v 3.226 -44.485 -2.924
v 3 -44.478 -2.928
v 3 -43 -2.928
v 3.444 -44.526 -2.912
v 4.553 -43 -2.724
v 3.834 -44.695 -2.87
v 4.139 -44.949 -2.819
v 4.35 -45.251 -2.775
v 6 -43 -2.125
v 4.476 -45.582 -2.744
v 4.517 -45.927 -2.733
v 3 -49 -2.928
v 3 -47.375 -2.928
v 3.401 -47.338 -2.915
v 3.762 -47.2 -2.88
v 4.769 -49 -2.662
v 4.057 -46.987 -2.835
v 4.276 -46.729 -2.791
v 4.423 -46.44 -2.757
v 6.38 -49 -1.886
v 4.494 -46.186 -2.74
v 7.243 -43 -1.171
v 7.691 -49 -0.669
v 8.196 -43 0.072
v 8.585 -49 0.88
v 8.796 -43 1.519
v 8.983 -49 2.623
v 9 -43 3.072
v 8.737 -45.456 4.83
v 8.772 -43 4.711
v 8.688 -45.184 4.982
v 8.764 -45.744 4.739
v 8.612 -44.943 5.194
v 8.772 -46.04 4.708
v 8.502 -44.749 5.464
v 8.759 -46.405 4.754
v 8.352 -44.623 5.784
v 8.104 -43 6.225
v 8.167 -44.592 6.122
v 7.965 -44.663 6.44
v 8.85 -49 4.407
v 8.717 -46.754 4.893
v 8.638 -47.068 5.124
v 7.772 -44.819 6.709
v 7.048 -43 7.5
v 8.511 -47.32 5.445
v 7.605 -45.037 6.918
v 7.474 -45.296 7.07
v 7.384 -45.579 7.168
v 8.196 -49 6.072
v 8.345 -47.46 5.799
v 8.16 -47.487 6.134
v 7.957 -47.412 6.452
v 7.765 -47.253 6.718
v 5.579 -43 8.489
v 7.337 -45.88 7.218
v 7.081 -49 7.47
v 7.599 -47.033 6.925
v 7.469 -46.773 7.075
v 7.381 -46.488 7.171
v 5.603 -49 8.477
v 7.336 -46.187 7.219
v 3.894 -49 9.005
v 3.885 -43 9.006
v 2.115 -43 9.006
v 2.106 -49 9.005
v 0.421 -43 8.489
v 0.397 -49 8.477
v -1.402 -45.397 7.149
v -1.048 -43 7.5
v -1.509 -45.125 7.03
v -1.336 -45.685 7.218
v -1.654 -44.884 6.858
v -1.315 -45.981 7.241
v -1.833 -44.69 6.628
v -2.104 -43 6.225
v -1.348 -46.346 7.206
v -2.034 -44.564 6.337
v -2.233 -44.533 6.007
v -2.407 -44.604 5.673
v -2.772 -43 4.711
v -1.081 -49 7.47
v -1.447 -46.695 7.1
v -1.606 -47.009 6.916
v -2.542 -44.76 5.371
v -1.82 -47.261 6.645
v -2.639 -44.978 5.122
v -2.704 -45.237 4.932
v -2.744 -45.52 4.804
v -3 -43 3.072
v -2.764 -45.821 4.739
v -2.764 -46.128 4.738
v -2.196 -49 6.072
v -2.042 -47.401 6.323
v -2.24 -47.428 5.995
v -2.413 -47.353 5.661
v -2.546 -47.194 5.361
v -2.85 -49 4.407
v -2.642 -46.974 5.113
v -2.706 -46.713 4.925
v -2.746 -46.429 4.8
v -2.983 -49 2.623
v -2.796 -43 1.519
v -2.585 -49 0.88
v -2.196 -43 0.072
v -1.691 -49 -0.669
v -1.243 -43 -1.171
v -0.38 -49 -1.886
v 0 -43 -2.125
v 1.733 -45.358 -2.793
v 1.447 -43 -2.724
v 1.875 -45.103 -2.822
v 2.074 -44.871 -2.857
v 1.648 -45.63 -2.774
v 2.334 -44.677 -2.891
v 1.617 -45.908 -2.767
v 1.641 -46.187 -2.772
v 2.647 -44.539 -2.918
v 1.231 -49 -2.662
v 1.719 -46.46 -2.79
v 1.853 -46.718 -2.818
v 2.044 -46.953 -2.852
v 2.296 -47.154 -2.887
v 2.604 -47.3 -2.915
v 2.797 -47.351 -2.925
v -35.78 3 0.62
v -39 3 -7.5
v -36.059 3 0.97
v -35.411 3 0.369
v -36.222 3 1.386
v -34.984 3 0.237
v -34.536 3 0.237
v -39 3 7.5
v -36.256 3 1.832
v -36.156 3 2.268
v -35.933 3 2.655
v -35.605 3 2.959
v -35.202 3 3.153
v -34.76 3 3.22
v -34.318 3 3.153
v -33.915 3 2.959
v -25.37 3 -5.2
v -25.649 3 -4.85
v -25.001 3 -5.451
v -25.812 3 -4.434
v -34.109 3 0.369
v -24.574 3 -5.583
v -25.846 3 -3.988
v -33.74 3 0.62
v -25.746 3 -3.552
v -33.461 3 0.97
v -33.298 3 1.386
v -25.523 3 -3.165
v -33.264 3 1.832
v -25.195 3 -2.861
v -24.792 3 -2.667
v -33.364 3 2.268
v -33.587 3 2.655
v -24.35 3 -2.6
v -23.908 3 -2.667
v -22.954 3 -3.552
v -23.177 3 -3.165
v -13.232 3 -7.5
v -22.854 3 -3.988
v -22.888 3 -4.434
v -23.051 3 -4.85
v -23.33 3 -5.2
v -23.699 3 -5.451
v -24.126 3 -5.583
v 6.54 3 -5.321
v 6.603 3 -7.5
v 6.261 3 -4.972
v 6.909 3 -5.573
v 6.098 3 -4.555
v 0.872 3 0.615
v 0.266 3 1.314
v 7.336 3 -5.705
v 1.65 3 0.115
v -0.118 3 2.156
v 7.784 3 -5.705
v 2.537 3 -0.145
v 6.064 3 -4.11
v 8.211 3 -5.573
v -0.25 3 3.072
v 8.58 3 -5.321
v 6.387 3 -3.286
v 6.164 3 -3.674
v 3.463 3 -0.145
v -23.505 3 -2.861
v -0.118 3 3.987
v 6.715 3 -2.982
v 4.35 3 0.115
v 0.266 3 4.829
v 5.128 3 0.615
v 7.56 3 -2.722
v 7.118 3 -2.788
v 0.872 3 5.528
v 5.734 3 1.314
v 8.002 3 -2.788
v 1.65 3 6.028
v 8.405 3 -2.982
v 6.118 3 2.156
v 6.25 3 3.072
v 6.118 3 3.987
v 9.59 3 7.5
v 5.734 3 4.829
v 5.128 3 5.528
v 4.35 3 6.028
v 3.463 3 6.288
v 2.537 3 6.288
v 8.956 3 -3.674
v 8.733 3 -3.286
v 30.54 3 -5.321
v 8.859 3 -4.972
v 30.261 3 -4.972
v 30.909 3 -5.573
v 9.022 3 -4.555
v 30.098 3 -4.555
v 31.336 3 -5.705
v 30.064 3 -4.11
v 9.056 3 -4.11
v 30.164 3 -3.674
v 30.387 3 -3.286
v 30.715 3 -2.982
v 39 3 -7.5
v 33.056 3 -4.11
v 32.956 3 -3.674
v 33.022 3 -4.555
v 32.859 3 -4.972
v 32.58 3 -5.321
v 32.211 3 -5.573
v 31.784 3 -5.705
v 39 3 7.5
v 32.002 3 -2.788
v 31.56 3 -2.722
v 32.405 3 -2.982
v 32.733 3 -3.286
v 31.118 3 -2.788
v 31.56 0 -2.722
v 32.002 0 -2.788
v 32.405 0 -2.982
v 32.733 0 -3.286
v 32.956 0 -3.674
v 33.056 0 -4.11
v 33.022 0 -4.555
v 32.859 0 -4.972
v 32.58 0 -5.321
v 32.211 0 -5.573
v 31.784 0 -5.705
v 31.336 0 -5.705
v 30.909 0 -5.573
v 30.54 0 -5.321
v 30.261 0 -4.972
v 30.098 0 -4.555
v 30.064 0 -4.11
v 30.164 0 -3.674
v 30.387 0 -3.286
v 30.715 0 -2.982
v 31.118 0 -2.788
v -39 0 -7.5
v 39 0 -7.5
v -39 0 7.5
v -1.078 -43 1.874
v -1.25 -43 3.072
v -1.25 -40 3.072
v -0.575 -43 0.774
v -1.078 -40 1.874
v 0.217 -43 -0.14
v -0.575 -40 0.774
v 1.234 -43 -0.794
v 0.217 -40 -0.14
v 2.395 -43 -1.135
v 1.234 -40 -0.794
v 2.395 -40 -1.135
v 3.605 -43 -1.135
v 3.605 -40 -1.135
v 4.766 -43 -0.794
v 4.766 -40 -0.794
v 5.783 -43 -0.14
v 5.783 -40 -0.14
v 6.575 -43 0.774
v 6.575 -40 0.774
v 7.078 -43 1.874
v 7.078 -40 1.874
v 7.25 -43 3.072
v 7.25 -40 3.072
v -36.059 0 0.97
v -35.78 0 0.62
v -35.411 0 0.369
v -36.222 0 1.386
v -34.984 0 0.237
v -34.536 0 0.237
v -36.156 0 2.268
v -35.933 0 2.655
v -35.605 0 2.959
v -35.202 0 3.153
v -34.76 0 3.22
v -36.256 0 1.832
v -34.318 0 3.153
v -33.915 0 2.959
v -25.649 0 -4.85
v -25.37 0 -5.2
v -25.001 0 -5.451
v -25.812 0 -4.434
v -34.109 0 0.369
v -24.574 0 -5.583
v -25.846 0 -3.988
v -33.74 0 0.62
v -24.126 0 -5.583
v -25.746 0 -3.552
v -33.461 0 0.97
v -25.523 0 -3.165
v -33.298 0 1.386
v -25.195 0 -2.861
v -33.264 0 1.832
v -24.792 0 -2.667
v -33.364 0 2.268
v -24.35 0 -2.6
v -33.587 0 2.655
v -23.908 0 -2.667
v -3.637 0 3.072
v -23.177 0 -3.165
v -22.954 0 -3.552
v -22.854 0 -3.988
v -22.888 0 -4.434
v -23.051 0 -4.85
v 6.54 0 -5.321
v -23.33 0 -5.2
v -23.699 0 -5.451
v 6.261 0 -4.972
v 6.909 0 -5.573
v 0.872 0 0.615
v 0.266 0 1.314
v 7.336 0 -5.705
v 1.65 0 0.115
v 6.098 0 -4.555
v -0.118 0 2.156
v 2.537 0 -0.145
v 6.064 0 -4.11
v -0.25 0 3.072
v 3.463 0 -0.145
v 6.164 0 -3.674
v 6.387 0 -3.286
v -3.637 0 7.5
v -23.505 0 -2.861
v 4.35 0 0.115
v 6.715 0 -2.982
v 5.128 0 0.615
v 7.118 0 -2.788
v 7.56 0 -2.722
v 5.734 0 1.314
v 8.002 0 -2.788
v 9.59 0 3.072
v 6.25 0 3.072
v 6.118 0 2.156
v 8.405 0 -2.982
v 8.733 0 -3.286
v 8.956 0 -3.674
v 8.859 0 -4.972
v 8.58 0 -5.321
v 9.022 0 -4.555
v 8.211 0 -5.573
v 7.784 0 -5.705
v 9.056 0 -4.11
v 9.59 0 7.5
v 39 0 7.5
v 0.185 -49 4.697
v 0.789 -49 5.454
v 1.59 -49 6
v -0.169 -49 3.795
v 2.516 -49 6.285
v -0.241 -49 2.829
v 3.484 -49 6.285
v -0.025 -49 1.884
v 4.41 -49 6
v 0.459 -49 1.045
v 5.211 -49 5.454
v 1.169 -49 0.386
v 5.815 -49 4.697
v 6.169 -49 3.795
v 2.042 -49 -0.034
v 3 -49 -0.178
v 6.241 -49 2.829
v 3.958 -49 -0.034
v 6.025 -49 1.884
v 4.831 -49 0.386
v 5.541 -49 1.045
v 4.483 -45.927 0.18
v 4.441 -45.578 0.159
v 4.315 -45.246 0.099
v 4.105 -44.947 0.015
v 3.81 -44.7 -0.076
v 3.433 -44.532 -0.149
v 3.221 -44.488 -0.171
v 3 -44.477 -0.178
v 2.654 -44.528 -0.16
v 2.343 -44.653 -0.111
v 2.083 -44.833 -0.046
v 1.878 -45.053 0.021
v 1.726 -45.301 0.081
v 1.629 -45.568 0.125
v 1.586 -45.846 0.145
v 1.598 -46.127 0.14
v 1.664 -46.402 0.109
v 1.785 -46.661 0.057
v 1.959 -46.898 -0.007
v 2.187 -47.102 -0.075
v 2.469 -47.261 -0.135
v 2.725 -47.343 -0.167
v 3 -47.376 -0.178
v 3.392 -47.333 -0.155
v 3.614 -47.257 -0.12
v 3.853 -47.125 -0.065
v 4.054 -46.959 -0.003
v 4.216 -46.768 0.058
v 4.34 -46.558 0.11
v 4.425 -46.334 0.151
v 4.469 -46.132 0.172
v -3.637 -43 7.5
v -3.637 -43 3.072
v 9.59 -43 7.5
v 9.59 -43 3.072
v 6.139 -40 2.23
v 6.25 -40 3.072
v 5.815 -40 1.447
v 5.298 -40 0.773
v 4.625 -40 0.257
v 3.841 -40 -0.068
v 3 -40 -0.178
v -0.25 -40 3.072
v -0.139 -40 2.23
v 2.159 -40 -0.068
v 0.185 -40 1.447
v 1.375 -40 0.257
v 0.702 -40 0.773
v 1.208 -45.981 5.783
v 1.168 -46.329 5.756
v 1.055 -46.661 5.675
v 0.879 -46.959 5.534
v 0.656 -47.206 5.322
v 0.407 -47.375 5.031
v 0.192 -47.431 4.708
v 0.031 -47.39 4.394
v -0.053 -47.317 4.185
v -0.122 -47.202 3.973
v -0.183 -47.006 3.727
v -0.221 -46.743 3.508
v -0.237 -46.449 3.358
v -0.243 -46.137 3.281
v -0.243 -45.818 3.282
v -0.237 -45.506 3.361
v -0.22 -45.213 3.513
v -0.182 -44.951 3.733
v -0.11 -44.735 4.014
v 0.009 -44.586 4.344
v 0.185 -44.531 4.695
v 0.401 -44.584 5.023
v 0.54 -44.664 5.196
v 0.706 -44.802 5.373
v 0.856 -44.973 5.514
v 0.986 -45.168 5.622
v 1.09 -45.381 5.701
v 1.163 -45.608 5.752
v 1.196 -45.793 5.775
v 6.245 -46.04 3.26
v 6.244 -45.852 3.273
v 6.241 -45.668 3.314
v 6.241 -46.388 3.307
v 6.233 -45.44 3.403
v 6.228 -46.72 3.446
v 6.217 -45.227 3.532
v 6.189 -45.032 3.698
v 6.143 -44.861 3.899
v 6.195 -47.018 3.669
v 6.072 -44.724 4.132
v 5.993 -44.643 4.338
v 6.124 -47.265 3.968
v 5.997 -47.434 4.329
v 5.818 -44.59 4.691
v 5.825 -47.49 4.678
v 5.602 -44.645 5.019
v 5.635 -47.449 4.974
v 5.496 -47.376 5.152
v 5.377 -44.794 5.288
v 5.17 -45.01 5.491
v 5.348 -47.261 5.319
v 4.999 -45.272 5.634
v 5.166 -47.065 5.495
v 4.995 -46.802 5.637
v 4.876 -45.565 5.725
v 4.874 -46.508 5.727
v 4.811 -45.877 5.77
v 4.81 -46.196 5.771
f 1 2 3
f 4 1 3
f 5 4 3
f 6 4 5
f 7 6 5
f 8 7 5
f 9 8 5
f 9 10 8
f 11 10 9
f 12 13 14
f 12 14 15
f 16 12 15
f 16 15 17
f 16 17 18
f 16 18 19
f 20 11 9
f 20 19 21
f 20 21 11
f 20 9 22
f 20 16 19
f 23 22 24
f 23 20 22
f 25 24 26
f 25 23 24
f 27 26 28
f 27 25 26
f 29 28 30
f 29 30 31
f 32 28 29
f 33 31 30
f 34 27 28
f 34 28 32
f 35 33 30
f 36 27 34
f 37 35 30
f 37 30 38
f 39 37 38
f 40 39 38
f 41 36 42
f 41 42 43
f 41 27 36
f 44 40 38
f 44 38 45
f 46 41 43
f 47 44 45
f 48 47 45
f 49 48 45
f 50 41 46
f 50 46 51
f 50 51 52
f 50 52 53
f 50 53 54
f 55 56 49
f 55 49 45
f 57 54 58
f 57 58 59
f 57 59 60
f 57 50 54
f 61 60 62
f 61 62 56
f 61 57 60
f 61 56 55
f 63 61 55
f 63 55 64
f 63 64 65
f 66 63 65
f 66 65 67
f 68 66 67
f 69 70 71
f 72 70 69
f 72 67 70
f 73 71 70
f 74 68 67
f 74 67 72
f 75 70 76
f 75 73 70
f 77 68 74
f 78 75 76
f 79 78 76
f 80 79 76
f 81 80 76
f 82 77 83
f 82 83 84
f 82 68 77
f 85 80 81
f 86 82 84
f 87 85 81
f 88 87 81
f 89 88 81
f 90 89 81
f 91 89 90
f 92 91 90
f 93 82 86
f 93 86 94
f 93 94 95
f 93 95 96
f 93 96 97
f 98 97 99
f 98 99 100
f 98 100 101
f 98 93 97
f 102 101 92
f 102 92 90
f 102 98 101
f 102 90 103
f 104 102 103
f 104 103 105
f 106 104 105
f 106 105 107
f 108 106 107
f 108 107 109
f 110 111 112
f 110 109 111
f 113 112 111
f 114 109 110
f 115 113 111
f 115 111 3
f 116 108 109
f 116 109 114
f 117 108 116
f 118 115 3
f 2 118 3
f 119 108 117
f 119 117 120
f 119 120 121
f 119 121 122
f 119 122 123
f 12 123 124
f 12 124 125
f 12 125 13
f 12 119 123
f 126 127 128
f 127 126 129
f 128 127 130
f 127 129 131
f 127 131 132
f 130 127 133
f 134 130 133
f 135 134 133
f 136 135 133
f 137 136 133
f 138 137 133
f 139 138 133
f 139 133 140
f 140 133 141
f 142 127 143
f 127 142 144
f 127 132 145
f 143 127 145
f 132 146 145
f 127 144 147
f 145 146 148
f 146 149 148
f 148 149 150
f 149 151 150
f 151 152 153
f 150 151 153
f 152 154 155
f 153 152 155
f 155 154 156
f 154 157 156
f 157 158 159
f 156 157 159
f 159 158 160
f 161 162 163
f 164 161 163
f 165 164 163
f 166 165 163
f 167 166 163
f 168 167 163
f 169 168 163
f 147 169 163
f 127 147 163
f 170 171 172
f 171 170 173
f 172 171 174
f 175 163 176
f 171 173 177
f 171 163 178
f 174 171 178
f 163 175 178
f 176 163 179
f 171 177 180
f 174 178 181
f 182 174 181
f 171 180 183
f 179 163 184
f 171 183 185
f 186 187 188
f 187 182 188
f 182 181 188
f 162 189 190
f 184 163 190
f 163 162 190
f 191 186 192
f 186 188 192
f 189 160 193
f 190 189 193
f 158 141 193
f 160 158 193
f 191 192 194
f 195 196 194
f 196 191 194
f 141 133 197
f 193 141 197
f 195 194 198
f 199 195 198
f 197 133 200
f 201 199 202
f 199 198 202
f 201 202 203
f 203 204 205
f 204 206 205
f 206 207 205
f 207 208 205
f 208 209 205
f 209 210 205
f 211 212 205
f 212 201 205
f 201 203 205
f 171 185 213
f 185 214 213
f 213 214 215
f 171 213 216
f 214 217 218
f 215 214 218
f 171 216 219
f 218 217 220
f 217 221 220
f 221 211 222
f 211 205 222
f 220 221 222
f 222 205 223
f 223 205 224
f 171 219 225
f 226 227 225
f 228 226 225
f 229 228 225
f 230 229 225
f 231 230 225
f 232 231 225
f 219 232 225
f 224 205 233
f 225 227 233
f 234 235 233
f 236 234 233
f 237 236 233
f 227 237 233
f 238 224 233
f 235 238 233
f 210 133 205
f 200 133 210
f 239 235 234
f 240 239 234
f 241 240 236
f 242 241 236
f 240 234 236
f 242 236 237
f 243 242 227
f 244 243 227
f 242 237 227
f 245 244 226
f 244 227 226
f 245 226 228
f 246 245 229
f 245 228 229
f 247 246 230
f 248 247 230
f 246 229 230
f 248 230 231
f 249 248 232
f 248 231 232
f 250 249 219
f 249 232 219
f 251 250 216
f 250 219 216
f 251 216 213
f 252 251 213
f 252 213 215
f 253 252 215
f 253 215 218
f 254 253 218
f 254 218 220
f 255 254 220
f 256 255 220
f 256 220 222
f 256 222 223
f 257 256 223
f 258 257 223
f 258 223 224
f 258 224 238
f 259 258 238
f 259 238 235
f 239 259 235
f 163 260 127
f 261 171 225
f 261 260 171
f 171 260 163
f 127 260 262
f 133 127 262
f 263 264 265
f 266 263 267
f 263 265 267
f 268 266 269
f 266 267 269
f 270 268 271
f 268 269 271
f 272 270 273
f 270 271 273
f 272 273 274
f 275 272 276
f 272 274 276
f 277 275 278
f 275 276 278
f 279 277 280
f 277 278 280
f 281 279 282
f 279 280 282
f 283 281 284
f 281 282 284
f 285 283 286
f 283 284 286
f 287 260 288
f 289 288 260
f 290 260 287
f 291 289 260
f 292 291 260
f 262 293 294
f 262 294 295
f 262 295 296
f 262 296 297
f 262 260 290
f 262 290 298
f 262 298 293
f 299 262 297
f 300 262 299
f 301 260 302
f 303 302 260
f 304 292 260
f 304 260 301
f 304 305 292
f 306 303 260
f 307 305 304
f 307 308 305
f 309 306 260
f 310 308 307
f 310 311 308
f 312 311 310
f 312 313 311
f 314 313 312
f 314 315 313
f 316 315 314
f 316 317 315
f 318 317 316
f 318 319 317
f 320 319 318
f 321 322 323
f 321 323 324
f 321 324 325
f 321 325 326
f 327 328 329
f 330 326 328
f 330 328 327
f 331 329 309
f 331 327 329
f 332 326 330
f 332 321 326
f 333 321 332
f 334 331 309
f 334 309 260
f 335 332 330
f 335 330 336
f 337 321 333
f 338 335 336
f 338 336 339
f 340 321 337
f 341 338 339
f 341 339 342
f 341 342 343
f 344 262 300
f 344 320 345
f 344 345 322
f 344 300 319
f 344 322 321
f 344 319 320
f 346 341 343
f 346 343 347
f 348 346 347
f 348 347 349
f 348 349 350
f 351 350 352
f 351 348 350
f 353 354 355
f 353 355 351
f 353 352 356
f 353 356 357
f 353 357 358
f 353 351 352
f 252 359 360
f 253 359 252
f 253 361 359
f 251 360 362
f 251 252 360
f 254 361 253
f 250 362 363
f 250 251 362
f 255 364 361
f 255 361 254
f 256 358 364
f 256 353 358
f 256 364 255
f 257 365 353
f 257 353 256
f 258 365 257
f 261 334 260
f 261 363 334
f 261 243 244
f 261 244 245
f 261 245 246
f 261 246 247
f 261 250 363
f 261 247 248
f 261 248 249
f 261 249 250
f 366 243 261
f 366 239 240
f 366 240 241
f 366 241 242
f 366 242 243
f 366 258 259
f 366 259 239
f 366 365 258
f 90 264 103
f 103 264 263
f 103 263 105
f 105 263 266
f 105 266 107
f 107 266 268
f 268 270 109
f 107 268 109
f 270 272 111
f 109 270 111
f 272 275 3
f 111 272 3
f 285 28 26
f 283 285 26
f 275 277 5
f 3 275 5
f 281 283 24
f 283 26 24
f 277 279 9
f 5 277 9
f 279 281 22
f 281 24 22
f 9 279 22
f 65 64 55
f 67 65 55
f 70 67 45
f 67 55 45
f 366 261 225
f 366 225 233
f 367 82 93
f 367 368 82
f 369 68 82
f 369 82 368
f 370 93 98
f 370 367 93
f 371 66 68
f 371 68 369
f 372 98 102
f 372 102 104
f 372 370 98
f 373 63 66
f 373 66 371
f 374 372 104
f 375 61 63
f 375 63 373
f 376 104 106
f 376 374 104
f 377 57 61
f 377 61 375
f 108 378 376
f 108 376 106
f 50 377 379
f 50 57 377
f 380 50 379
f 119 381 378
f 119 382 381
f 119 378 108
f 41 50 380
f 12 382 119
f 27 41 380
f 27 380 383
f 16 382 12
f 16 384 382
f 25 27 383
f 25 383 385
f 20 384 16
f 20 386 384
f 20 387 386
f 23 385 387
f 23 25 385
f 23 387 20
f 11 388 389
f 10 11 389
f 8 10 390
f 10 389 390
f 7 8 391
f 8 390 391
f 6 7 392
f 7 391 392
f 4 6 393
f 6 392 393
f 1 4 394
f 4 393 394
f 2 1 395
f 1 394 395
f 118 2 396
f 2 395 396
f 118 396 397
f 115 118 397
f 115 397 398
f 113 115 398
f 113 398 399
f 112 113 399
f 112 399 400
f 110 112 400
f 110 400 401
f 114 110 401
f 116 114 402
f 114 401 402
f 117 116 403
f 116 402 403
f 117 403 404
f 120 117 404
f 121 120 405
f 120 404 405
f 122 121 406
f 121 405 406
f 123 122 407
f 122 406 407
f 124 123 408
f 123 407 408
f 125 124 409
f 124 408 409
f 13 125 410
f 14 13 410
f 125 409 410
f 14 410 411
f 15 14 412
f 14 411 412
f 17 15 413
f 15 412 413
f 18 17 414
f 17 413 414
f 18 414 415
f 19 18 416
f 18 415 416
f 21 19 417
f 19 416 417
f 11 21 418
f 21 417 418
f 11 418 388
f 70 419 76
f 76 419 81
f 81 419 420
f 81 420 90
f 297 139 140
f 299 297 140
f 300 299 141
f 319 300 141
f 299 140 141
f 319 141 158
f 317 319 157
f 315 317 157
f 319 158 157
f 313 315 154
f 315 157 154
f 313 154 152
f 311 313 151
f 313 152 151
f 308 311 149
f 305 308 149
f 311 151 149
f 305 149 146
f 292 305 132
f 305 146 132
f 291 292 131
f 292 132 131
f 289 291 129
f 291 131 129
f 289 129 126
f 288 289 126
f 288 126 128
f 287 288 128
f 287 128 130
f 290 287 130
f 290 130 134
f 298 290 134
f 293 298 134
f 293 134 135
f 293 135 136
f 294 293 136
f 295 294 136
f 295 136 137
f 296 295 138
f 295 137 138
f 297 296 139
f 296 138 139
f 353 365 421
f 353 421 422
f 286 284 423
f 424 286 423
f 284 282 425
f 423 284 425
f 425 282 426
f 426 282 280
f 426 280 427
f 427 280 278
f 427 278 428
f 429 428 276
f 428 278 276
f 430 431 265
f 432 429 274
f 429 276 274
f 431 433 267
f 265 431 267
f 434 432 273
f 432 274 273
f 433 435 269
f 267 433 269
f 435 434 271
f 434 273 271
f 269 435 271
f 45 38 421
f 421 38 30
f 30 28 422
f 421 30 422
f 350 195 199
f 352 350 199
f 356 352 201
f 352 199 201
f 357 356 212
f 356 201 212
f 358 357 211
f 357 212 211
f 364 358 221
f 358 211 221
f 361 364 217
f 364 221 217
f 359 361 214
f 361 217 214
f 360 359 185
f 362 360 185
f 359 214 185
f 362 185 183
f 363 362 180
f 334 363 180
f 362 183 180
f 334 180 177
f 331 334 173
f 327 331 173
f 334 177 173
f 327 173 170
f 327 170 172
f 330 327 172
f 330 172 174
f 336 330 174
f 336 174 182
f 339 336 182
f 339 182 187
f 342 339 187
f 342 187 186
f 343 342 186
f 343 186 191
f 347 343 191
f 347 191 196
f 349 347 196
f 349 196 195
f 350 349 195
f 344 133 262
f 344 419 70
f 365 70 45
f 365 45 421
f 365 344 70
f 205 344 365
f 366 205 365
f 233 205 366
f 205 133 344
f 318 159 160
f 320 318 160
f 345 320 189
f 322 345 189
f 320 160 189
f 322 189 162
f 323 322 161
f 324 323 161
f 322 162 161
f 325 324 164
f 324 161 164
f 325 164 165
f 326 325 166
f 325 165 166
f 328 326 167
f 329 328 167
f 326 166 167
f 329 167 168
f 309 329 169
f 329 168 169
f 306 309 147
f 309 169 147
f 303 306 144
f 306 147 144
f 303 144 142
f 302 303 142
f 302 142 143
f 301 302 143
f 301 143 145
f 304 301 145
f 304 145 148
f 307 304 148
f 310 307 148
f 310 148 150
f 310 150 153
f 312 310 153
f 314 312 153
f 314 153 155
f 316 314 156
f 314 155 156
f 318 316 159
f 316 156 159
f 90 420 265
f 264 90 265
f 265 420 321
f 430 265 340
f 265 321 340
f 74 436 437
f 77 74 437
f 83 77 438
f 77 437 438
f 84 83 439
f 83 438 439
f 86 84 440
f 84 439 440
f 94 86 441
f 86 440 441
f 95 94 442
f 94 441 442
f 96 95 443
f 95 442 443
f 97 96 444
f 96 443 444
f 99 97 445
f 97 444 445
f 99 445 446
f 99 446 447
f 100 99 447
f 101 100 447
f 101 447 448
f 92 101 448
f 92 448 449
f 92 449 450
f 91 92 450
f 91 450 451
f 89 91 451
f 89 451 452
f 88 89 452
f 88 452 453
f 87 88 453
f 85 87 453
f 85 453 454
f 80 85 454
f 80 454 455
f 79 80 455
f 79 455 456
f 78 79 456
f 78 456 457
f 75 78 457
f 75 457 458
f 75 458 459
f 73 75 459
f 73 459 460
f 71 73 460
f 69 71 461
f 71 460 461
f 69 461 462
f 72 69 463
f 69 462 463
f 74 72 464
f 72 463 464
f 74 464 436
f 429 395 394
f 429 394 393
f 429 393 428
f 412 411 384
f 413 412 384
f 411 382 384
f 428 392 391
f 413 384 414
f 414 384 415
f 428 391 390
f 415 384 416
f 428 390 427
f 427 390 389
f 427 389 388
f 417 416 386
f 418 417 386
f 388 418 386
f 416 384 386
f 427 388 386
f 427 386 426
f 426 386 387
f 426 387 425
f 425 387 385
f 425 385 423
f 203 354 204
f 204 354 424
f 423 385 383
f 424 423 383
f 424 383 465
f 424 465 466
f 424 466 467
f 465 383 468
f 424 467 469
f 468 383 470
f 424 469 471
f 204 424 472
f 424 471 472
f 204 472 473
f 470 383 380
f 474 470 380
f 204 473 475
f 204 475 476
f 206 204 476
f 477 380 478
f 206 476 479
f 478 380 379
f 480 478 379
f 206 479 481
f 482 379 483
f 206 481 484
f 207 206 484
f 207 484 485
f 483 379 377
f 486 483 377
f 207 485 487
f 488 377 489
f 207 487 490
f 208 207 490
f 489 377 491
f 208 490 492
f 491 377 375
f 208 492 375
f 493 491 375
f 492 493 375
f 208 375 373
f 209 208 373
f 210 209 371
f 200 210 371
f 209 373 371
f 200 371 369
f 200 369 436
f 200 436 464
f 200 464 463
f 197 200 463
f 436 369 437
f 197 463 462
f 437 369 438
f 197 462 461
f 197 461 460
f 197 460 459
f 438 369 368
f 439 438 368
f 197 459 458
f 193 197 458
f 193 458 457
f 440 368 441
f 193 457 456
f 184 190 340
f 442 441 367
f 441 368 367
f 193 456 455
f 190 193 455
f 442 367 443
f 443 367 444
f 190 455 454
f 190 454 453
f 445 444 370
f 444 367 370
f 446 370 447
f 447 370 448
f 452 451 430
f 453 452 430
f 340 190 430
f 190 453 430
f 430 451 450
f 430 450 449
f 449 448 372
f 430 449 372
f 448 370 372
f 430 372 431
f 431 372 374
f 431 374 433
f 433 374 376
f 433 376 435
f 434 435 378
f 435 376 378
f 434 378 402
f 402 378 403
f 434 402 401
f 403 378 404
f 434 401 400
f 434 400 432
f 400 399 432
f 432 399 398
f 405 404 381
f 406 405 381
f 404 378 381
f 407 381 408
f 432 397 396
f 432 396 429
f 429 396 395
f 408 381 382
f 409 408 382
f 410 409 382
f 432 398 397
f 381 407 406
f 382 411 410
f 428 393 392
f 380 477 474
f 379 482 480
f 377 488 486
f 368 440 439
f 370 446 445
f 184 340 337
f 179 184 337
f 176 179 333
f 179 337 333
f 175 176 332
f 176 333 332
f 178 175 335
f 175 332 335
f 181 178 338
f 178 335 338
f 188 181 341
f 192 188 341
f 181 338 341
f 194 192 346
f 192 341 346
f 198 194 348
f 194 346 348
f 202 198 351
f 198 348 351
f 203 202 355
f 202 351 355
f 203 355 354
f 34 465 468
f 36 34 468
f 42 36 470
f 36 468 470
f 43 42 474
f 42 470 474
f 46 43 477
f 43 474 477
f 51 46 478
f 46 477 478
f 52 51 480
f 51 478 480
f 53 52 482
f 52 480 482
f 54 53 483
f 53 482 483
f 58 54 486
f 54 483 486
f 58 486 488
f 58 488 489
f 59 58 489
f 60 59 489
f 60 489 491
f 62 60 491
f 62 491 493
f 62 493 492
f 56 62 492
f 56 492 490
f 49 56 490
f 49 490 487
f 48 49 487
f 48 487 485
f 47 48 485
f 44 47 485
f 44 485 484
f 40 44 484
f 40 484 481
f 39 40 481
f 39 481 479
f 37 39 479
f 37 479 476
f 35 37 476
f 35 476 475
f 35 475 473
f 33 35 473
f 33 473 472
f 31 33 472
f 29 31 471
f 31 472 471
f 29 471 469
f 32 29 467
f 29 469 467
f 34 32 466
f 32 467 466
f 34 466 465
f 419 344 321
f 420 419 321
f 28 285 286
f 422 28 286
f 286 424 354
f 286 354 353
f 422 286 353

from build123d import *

# Parameters (mm, degrees)
SKETCH_1_W                = 78
SKETCH_1_H                = 15
EXTRUDE_1_DEPTH           = 3
SKETCH_3_R                = 1.5
CUT_EXTRUDE_1_DEPTH       = 3
SKETCH_4_R                = 6
EXTRUDE_2_DEPTH           = 18
SKETCH_5_R                = 4.5
CUT_EXTRUDE_2_DEPTH       = 21
F_2_0MM_2_D               = 3
F_2_0MM_2_DEPTH           = 4.5
F_2_0MM_2_TIP             = 1.5
F_2_0MM_2_ON_FACE_2_D     = 3
F_2_0MM_2_ON_FACE_2_DEPTH = 4.5
F_2_0MM_2_ON_FACE_2_TIP   = 1.5
SKETCH_10_W               = 6
SKETCH_10_H               = 10
CUT_EXTRUDE_3_DEPTH       = 7
SKETCH_13_W               = 19.835687411
SKETCH_13_H               = 21.610205193
CUT_EXTRUDE_4_DEPTH       = 20
SKETCH_14_W               = 11.523038103
SKETCH_14_H               = 10.49031299
EXTRUDE_3_DEPTH           = 3
SKETCH_18_W               = 78
SKETCH_18_H               = 8
EXTRUDE_4_DEPTH           = 3
SKETCH_19_W               = 36.767904102
SKETCH_19_H               = 2.5
EXTRUDE_5_DEPTH           = 12.5
SKETCH_23_R               = 1.65
CUT_EXTRUDE_6_DEPTH       = 12.5
SKETCH_25_W               = 4.236607592
SKETCH_25_H               = 5.36409187
EXTRUDE_7_DEPTH           = 2.5
SKETCH_26_R               = 1.6
CUT_EXTRUDE_7_DEPTH       = 2.5
SKETCH_27_W               = 21.346012392
SKETCH_27_H               = 6.594354882
EXTRUDE_8_DEPTH           = 2.5
SKETCH_28_W               = 36.767231154
SKETCH_28_H               = 5.91819544
EXTRUDE_9_DEPTH           = 2.5
SKETCH_29_W               = 27.660340415
SKETCH_29_H               = 3.5
CUT_EXTRUDE_9_DEPTH       = 2.5
SKETCH_30_W               = 78
SKETCH_30_H               = 8
CUT_EXTRUDE_10_DEPTH      = 100
SKETCH_31_W               = 60.820132647
SKETCH_31_H               = 3
EXTRUDE_10_DEPTH          = 49
SKETCH_32_W               = 48
SKETCH_32_H               = 3.2
CUT_EXTRUDE_11_DEPTH      = 49
SKETCH_33_W               = 15
SKETCH_33_H               = 49.05968874
CUT_EXTRUDE_12_DEPTH      = 100
SKETCH_34_R               = 4.25
EXTRUDE_11_DEPTH          = 49
SKETCH_35_R               = 6
EXTRUDE_12_DEPTH          = 6
SKETCH_36_W               = 8.5
SKETCH_36_H               = 40
CUT_EXTRUDE_13_DEPTH      = 11
SKETCH_37_R               = 3.25
CUT_EXTRUDE_16_DEPTH      = 100
SKETCH_39_W               = 8.456699936
SKETCH_39_H               = 16
CUT_EXTRUDE_17_DEPTH      = 1.25
F_3_0MM_1_D               = 2.9
F_3_0MM_1_DEPTH           = 4.128752102
F_3_0MM_1_TIP             = 0.871247898
F_3_0MM_2_D               = 2.9
F_3_0MM_2_DEPTH           = 4.128752102
F_3_0MM_2_TIP             = 0.871247898
F_3_0MM_3_D               = 2.9
F_3_0MM_3_DEPTH           = 4.128752102
F_3_0MM_3_TIP             = 0.871247898
SKETCH_46_W               = 13.227107738
SKETCH_46_H               = 4.428434999
EXTRUDE_13_DEPTH          = 46
CUT_EXTRUDE_18_DEPTH      = 55


with BuildPart() as part:
    # 草图1 → 凸台-拉伸1 (new body)
    with BuildSketch(Plane(origin=(0, 0, 0), x_dir=(1, 0, 0), z_dir=(0, 1, 0))):
        Rectangle(SKETCH_1_W, SKETCH_1_H)
    extrude(amount=EXTRUDE_1_DEPTH)

    # 草图3 → 切除-拉伸1 (cut)
    with BuildSketch(Plane(origin=(0, 3, 0), x_dir=(1, 0, 0), z_dir=(0, 1, 0))):
        with Locations((-34.76, -1.72)):
            Circle(SKETCH_3_R)
        with Locations((-24.35, 4.1)):
            Circle(SKETCH_3_R)
        with Locations((31.56, 4.221692081)):
            Circle(SKETCH_3_R)
        with Locations((7.56, 4.221692081)):
            Circle(SKETCH_3_R)
    extrude(amount=-CUT_EXTRUDE_1_DEPTH, mode=Mode.SUBTRACT)

    # 草图4 → 凸台-拉伸2 (add)
    with BuildSketch(Plane(origin=(0, 3, 0), x_dir=(1, 0, 0), z_dir=(0, 1, 0))):
        with Locations((-3, -1.234165229)):
            Circle(SKETCH_4_R)
    extrude(amount=EXTRUDE_2_DEPTH)

    # 草图5 → 切除-拉伸2 (cut)
    with BuildSketch(Plane(origin=(0, 21, 0), x_dir=(1, 0, 0), z_dir=(0, 1, 0))):
        with Locations((-3, -1.234165229)):
            Circle(SKETCH_5_R)
    extrude(amount=-CUT_EXTRUDE_2_DEPTH, mode=Mode.SUBTRACT)

    # Ø2.0mm 暗销孔2
    with Locations(Plane(origin=(-7.901331048, 17.342107422, 4.694938836), x_dir=(-0.576795601176, 0, -0.816888507977), z_dir=(-0.816888507977, 0, 0.576795601176))):
        with Locations((0, 0)):
            Hole(F_2_0MM_2_D / 2, depth=F_2_0MM_2_DEPTH)
            with Locations((0, 0, -(F_2_0MM_2_DEPTH + F_2_0MM_2_TIP / 2))):  # 90° drill point
                Cone(0, F_2_0MM_2_D / 2, F_2_0MM_2_TIP, mode=Mode.SUBTRACT)

    # Ø2.0mm 暗销孔2 on face 2
    with Locations(Plane(origin=(1.071764877, 17.164817099, 5.641061052), x_dir=(0.734483043181, 0, -0.678627039897), z_dir=(0.678627039897, 0, 0.734483043181))):
        with Locations((0, 0)):
            Hole(F_2_0MM_2_ON_FACE_2_D / 2, depth=F_2_0MM_2_ON_FACE_2_DEPTH)
            with Locations((0, 0, -(F_2_0MM_2_ON_FACE_2_DEPTH + F_2_0MM_2_ON_FACE_2_TIP / 2))):  # 90° drill point
                Cone(0, F_2_0MM_2_ON_FACE_2_D / 2, F_2_0MM_2_ON_FACE_2_TIP, mode=Mode.SUBTRACT)

    # 草图10 → 切除-拉伸3 (cut)
    with BuildSketch(Plane(origin=(0, 0, -7.5), x_dir=(-1, 0, 0), z_dir=(0, 0, -1))):
        with Locations((3, 8)):
            Rectangle(SKETCH_10_W, SKETCH_10_H)
    extrude(amount=-CUT_EXTRUDE_3_DEPTH, mode=Mode.SUBTRACT)

    # 草图13 → 切除-拉伸4 (cut)
    with BuildSketch(Plane(origin=(0, 0, -7.5), x_dir=(-1, 0, 0), z_dir=(0, 0, -1))):
        with Locations((3.314421038, 13.805102597)):
            Rectangle(SKETCH_13_W, SKETCH_13_H)
    extrude(amount=-CUT_EXTRUDE_4_DEPTH, mode=Mode.SUBTRACT)

    # 草图14 → 凸台-拉伸3 (add)
    with BuildSketch(Plane(origin=(0, 3, 0), x_dir=(1, 0, 0), z_dir=(0, 1, 0))):
        with Locations((-2.989467433, -1.263493391)):
            Rectangle(SKETCH_14_W, SKETCH_14_H)
    extrude(amount=-EXTRUDE_3_DEPTH)

    # 草图18 → 凸台-拉伸4 (add)
    with BuildSketch(Plane.XZ):
        with Locations((0, 11.5)):
            Rectangle(SKETCH_18_W, SKETCH_18_H)
    extrude(amount=-EXTRUDE_4_DEPTH)

    # 草图19 → 凸台-拉伸5 (add)
    with BuildSketch(Plane.XZ):
        with Locations((0.839237194, 14.25)):
            Rectangle(SKETCH_19_W, SKETCH_19_H)
    extrude(amount=EXTRUDE_5_DEPTH)

    # 草图23 → 切除-拉伸6 (cut)
    with BuildSketch(Plane(origin=(0, 0, 13), x_dir=(-1, 0, 0), z_dir=(0, 0, -1))):
        with Locations((-8.603189245, -6.05592298)):
            Circle(SKETCH_23_R)
        with Locations((2.596810755, -6.05592298)):
            Circle(SKETCH_23_R)
    extrude(amount=-CUT_EXTRUDE_6_DEPTH, mode=Mode.SUBTRACT)

    # 草图25 → 凸台-拉伸7 (add)
    with BuildSketch(Plane(origin=(0, 0, 13), x_dir=(-1, 0, 0), z_dir=(0, 0, -1))):
        with Locations((2.330668631, -6.426480946)):
            Rectangle(SKETCH_25_W, SKETCH_25_H)
    extrude(amount=-EXTRUDE_7_DEPTH)

    # 草图26 → 切除-拉伸7 (cut)
    with BuildSketch(Plane(origin=(0, 0, 13), x_dir=(-1, 0, 0), z_dir=(0, 0, -1))):
        with Locations((4.196810755, -6.05592298)):
            Circle(SKETCH_26_R)
    extrude(amount=-CUT_EXTRUDE_7_DEPTH, mode=Mode.SUBTRACT)

    # 草图27 → 凸台-拉伸8 (add)
    with BuildSketch(Plane(origin=(0, 0, 13), x_dir=(-1, 0, 0), z_dir=(0, 0, -1))):
        with Locations((-2.379316694, -6.691741876)):
            Rectangle(SKETCH_27_W, SKETCH_27_H)
    extrude(amount=-EXTRUDE_8_DEPTH)

    # 草图28 → 凸台-拉伸9 (add)
    with BuildSketch(Plane(origin=(0, 0, 13), x_dir=(-1, 0, 0), z_dir=(0, 0, -1))):
        with Locations((-0.839573668, -15.45909772)):
            Rectangle(SKETCH_28_W, SKETCH_28_H)
    extrude(amount=-EXTRUDE_9_DEPTH)

    # 草图29 → 切除-拉伸9 (cut)
    with BuildSketch(Plane(origin=(0, 0, 13), x_dir=(-1, 0, 0), z_dir=(0, 0, -1))):
        with Locations((-0.633763758, -13.394190827)):
            Rectangle(SKETCH_29_W, SKETCH_29_H)
    extrude(amount=-CUT_EXTRUDE_9_DEPTH, mode=Mode.SUBTRACT)

    # 草图30 → 切除-拉伸10 (cut)
    with BuildSketch(Plane(origin=(0, 3, 0), x_dir=(1, 0, 0), z_dir=(0, 1, 0))):
        with Locations((0, -11.5)):
            Rectangle(SKETCH_30_W, SKETCH_30_H)
    extrude(amount=-CUT_EXTRUDE_10_DEPTH, mode=Mode.SUBTRACT)

    # 草图31 → 凸台-拉伸10 (add)
    with BuildSketch(Plane.XZ):
        with Locations((0.65611444, 6)):
            Rectangle(SKETCH_31_W, SKETCH_31_H)
    extrude(amount=EXTRUDE_10_DEPTH)

    # 草图32 → 切除-拉伸11 (cut)
    with BuildSketch(Plane(origin=(0, 0, 4.5), x_dir=(-1, 0, 0), z_dir=(0, 0, -1))):
        with Locations((-0.15338956, -37.454114518)):
            Rectangle(SKETCH_32_W, SKETCH_32_H)
        with Locations((-0.189333293, -44.654114518)):
            Rectangle(SKETCH_32_W, SKETCH_32_H)
        with Locations((-0.173277927, -30.254114518)):
            Rectangle(SKETCH_32_W, SKETCH_32_H)
        with Locations((-0.205191163, -23.054114518)):
            Rectangle(SKETCH_32_W, SKETCH_32_H)
        with Locations((-0.175604554, -15.854114518)):
            Rectangle(SKETCH_32_W, SKETCH_32_H)
        with Locations((-0.276259634, -9.654114518)):
            Rectangle(SKETCH_32_W, SKETCH_32_H)
    extrude(amount=-CUT_EXTRUDE_11_DEPTH, mode=Mode.SUBTRACT)

    # 草图33 → 切除-拉伸12 (cut)
    with BuildSketch(Plane(origin=(31.066180764, 0, 0), x_dir=(0, 0, -1), z_dir=(1, 0, 0))):
        with Locations((0, -24.52984437)):
            Rectangle(SKETCH_33_W, SKETCH_33_H)
    extrude(amount=-CUT_EXTRUDE_12_DEPTH, mode=Mode.SUBTRACT)

    # 草图34 → 凸台-拉伸11 (add)
    with BuildSketch(Plane.XZ):
        with Locations((3, 3.071565001)):
            Circle(SKETCH_34_R)
    extrude(amount=EXTRUDE_11_DEPTH)

    # 草图35 → 凸台-拉伸12 (add)
    with BuildSketch(Plane.XZ.offset(49)):
        with Locations((3, 3.071565001)):
            Circle(SKETCH_35_R)
    extrude(amount=-EXTRUDE_12_DEPTH)

    # 草图36 → 切除-拉伸13 (cut)
    with BuildSketch(Plane(origin=(0, 0, -7.5), x_dir=(-1, 0, 0), z_dir=(0, 0, -1))):
        with Locations((-3, -20)):
            Rectangle(SKETCH_36_W, SKETCH_36_H)
    extrude(amount=-CUT_EXTRUDE_13_DEPTH, mode=Mode.SUBTRACT)

    # 草图37 → 切除-拉伸16 (cut)
    with BuildSketch(Plane.XZ.offset(49)):
        with Locations((3, 3.071565001)):
            Circle(SKETCH_37_R)
    extrude(amount=-CUT_EXTRUDE_16_DEPTH, mode=Mode.SUBTRACT)

    # 草图39 → 切除-拉伸17 (cut)
    with BuildSketch(Plane(origin=(0, 0, 3.5), x_dir=(-1, 0, 0), z_dir=(0, 0, -1))):
        with Locations((-3, -32)):
            Rectangle(SKETCH_39_W, SKETCH_39_H)
    extrude(amount=-CUT_EXTRUDE_17_DEPTH, mode=Mode.SUBTRACT)

    # Ø3.0mm 暗销孔1
    with Locations(Plane(origin=(3.06916604, -45.926554475, -2.928036324), x_dir=(-0.999933554166, 0, -0.011527673319), z_dir=(0.011527673319, 0, -0.999933554166))):
        with Locations((0, 0)):
            Hole(F_3_0MM_1_D / 2, depth=F_3_0MM_1_DEPTH)
            with Locations((0, 0, -(F_3_0MM_1_DEPTH + F_3_0MM_1_TIP / 2))):  # 118° drill point
                Cone(0, F_3_0MM_1_D / 2, F_3_0MM_1_TIP, mode=Mode.SUBTRACT)

    # Ø3.0mm 暗销孔2
    with Locations(Plane(origin=(-2.19436254, -45.980907568, 6.074663036), x_dir=(-0.500516339146, 0, -0.865727089936), z_dir=(-0.865727089936, 0, 0.500516339146))):
        with Locations((0, 0)):
            Hole(F_3_0MM_2_D / 2, depth=F_3_0MM_2_DEPTH)
            with Locations((0, 0, -(F_3_0MM_2_DEPTH + F_3_0MM_2_TIP / 2))):  # 118° drill point
                Cone(0, F_3_0MM_2_D / 2, F_3_0MM_2_TIP, mode=Mode.SUBTRACT)

    # Ø3.0mm 暗销孔3
    with Locations(Plane(origin=(8.205806468, -46.039954185, 6.054781221), x_dir=(-0.497202703373, 0, 0.86763441135), z_dir=(0.86763441135, 0, 0.497202703373))):
        with Locations((0, 0)):
            Hole(F_3_0MM_3_D / 2, depth=F_3_0MM_3_DEPTH)
            with Locations((0, 0, -(F_3_0MM_3_DEPTH + F_3_0MM_3_TIP / 2))):  # 118° drill point
                Cone(0, F_3_0MM_3_D / 2, F_3_0MM_3_TIP, mode=Mode.SUBTRACT)

    # 草图46 → 凸台-拉伸13 (add)
    with BuildSketch(Plane(origin=(0, 3, 0), x_dir=(1, 0, 0), z_dir=(0, 1, 0))):
        with Locations((2.976074231, -5.285782501)):
            Rectangle(SKETCH_46_W, SKETCH_46_H)
    extrude(amount=-EXTRUDE_13_DEPTH)

    # 草图48 → 切除-拉伸18 (cut)
    with BuildSketch(Plane.XZ.offset(49)):
        with BuildLine():
            Line((-0.25, 3.071565001), (6.25, 3.071565001))
            ThreePointArc((6.25, 3.071565001), (3, 6.321565001), (-0.25, 3.071565001))
        make_face()
    extrude(amount=-CUT_EXTRUDE_18_DEPTH, mode=Mode.SUBTRACT)


solid = part.part
